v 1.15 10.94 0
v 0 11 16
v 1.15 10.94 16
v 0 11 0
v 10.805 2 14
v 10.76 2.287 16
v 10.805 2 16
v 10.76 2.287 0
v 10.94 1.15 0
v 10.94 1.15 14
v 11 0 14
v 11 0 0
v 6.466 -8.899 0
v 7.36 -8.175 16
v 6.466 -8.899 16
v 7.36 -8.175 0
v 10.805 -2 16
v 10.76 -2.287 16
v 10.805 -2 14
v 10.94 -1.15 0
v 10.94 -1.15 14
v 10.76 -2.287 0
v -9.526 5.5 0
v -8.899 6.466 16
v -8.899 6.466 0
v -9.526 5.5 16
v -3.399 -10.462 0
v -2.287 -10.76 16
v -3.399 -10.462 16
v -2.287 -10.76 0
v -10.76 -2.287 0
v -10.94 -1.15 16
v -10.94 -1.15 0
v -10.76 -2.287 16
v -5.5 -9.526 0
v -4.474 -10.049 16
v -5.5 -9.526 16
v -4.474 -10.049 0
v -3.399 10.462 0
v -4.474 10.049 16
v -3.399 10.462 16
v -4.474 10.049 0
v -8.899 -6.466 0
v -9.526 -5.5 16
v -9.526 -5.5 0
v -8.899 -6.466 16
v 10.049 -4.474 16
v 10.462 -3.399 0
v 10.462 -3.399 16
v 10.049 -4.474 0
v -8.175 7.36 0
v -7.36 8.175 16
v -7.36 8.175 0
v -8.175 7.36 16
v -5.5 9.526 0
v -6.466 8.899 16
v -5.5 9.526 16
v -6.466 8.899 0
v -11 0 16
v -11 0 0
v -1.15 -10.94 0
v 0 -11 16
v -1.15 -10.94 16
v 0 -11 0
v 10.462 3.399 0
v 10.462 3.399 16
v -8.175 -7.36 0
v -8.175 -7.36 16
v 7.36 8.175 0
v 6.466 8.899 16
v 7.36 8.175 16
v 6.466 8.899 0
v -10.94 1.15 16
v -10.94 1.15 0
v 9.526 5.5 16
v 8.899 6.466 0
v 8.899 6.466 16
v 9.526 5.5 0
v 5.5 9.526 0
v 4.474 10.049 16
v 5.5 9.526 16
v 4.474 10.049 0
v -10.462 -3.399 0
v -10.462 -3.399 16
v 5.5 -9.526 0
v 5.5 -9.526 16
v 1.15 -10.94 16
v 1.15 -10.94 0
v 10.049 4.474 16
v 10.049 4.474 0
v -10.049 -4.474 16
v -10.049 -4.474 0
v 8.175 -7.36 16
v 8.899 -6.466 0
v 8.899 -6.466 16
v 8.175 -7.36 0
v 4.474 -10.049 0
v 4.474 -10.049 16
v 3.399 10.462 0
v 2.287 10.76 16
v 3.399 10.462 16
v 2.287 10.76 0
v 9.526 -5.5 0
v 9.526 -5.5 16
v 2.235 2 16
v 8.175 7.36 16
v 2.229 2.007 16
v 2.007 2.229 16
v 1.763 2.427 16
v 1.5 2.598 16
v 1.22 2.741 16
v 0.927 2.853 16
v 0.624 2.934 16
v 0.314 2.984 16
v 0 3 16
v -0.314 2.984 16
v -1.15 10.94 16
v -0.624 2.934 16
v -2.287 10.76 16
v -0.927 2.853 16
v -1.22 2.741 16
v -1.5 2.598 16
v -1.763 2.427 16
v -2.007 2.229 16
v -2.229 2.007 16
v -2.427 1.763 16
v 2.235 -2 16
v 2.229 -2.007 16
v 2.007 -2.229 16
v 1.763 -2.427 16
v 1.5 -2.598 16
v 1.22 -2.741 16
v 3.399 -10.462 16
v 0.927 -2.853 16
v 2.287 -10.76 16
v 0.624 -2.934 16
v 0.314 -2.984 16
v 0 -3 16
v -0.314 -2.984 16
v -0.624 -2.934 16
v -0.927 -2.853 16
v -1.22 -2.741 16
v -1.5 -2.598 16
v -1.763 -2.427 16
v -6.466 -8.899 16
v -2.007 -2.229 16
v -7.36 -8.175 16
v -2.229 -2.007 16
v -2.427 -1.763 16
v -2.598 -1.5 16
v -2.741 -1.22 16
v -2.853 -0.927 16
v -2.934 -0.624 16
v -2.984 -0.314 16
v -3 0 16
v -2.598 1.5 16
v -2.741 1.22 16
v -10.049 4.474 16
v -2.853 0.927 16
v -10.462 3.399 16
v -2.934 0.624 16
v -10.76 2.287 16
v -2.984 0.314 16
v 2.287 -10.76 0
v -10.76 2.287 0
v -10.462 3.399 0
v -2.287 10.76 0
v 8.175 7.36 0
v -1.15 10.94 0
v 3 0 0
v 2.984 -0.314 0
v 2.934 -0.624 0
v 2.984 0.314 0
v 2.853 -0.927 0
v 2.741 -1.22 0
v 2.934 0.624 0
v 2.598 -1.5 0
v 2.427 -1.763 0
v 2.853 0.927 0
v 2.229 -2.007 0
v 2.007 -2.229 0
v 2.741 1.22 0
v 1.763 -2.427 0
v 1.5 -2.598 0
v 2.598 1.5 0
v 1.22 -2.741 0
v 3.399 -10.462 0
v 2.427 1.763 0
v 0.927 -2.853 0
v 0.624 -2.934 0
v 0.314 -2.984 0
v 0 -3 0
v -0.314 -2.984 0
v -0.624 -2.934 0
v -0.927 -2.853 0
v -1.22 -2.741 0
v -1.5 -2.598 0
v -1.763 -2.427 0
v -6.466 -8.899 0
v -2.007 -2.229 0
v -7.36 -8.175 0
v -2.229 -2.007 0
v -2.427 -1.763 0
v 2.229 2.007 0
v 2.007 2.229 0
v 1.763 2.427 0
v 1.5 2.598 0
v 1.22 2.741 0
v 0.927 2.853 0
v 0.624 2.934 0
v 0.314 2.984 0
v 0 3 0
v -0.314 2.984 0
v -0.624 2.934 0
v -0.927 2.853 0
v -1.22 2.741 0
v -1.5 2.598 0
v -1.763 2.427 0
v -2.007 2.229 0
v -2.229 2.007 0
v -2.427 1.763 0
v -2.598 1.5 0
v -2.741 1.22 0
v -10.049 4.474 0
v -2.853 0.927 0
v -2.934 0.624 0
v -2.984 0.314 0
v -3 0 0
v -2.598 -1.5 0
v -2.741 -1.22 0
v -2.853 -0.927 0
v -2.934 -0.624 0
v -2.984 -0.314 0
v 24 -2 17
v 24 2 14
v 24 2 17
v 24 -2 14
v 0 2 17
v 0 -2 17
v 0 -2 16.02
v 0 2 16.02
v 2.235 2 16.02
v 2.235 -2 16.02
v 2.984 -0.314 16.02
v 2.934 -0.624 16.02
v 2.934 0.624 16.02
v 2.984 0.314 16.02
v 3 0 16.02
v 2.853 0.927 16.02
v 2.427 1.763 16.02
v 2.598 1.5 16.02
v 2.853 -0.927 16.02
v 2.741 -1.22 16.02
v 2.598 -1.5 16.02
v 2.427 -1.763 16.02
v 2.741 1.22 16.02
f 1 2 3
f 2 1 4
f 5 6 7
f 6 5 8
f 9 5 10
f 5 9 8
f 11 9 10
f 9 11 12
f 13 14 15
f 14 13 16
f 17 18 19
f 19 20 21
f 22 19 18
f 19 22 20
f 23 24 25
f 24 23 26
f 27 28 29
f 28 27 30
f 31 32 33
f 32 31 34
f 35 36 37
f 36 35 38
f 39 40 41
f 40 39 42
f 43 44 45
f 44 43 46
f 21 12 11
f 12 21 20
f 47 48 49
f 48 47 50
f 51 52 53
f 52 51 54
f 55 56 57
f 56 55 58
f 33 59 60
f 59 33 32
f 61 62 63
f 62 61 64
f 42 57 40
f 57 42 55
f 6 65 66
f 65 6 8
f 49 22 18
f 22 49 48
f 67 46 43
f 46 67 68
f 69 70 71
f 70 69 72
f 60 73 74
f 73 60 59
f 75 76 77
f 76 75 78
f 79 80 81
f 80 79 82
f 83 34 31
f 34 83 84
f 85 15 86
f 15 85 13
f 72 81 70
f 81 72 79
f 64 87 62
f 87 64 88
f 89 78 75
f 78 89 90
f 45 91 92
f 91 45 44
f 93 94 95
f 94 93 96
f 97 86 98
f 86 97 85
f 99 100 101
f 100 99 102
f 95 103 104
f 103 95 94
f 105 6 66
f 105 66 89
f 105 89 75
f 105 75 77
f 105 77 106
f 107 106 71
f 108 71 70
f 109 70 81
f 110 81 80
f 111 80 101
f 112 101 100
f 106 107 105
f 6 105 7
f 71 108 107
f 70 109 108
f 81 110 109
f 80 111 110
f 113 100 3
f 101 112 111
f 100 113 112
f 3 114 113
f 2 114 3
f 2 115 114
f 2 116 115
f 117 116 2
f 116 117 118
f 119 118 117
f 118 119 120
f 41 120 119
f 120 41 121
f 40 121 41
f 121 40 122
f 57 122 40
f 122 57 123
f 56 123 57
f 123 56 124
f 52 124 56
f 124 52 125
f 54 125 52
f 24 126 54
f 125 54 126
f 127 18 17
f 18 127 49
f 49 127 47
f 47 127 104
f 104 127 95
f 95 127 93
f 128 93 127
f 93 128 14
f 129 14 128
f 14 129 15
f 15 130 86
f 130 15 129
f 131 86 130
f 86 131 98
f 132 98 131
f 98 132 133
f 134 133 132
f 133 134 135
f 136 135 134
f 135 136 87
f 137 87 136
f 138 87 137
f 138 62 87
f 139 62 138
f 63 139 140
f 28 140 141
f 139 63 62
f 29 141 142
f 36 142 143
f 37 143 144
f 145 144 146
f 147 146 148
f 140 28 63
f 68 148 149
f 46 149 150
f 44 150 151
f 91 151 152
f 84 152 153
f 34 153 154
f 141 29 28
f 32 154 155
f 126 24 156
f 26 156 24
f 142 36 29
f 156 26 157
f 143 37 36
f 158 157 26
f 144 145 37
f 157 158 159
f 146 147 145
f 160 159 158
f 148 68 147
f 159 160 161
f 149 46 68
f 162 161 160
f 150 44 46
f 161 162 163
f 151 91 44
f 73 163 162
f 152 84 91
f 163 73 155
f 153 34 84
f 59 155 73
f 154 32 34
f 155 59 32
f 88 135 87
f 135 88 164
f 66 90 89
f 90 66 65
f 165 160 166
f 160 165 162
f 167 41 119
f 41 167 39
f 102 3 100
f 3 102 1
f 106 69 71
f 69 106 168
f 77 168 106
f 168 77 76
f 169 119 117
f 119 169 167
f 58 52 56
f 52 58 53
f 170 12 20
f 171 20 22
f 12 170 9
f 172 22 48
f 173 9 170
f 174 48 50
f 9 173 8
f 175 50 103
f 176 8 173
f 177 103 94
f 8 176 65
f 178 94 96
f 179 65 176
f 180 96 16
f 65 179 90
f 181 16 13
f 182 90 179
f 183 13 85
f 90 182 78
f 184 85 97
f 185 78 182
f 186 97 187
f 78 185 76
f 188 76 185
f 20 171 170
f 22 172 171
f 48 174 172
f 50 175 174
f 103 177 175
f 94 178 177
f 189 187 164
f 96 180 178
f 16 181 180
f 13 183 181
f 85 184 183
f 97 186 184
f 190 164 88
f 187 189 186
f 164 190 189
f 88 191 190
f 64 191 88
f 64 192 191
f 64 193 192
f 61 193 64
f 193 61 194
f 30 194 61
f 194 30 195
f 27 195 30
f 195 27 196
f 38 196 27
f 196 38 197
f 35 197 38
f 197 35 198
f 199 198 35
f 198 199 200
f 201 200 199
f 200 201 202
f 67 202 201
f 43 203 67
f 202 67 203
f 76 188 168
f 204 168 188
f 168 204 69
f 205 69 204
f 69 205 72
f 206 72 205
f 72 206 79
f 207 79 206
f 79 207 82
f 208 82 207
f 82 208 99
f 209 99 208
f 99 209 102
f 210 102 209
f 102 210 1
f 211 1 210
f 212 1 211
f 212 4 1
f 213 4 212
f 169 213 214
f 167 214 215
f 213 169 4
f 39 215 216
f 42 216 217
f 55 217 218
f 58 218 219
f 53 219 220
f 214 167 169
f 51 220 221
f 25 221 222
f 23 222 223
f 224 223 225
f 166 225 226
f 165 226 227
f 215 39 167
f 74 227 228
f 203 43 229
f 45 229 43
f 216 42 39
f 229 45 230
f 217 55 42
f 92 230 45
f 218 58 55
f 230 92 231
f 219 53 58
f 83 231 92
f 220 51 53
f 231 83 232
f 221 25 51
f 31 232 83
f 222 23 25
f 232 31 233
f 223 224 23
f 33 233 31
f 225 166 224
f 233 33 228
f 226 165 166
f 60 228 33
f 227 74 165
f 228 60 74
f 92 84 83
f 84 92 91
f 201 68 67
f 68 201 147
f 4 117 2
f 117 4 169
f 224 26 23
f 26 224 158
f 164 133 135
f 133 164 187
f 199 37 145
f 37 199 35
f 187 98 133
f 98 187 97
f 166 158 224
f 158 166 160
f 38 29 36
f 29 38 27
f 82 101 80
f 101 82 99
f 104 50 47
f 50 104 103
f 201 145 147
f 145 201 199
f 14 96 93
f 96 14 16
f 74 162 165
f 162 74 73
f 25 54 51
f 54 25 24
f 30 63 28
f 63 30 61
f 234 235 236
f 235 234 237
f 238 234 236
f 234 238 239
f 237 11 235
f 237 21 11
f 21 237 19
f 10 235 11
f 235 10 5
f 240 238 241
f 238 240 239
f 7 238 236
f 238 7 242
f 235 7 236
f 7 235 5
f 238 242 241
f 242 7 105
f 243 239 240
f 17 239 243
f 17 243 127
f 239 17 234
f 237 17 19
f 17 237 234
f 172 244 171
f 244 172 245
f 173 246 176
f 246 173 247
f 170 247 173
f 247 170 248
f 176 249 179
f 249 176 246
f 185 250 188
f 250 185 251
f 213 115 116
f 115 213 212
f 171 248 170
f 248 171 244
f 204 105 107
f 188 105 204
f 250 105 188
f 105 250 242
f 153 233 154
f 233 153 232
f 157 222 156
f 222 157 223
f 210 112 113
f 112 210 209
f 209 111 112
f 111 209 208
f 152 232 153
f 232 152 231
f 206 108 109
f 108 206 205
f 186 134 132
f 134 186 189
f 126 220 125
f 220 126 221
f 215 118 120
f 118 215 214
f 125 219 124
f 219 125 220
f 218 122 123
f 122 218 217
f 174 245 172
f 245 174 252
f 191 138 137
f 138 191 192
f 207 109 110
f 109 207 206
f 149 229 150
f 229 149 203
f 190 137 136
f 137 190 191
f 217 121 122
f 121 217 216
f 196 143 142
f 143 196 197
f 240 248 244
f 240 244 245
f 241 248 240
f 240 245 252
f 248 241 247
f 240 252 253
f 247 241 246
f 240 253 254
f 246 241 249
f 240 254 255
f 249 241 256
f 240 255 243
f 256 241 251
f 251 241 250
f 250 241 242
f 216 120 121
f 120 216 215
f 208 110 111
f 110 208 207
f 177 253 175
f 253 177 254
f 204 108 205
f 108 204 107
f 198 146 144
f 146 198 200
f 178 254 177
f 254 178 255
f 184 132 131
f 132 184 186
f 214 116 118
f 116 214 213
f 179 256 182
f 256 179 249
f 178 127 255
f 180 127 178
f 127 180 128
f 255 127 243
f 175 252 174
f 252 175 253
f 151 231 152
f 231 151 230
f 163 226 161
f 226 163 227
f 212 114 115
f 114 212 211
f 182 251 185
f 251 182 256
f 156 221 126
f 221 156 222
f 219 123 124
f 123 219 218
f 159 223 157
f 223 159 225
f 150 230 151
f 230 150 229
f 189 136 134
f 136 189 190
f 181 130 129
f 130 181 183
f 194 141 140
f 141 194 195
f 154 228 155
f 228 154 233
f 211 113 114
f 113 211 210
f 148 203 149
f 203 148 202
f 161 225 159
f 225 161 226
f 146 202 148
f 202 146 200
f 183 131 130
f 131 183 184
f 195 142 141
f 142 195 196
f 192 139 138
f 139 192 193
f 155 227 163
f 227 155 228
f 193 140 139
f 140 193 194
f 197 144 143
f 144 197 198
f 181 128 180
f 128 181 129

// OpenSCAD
// Quarter-turn cam lock.
$fn = 60;
eps = 0.02;
body_d = 22;
body_l = 16;
arm_l = 24;
difference() { union() { cylinder(d=body_d,h=body_l); translate([0,-2,body_l-2]) cube([arm_l,4,3]); } translate([0,0,-eps]) cylinder(d=6,h=body_l+2*eps); }
